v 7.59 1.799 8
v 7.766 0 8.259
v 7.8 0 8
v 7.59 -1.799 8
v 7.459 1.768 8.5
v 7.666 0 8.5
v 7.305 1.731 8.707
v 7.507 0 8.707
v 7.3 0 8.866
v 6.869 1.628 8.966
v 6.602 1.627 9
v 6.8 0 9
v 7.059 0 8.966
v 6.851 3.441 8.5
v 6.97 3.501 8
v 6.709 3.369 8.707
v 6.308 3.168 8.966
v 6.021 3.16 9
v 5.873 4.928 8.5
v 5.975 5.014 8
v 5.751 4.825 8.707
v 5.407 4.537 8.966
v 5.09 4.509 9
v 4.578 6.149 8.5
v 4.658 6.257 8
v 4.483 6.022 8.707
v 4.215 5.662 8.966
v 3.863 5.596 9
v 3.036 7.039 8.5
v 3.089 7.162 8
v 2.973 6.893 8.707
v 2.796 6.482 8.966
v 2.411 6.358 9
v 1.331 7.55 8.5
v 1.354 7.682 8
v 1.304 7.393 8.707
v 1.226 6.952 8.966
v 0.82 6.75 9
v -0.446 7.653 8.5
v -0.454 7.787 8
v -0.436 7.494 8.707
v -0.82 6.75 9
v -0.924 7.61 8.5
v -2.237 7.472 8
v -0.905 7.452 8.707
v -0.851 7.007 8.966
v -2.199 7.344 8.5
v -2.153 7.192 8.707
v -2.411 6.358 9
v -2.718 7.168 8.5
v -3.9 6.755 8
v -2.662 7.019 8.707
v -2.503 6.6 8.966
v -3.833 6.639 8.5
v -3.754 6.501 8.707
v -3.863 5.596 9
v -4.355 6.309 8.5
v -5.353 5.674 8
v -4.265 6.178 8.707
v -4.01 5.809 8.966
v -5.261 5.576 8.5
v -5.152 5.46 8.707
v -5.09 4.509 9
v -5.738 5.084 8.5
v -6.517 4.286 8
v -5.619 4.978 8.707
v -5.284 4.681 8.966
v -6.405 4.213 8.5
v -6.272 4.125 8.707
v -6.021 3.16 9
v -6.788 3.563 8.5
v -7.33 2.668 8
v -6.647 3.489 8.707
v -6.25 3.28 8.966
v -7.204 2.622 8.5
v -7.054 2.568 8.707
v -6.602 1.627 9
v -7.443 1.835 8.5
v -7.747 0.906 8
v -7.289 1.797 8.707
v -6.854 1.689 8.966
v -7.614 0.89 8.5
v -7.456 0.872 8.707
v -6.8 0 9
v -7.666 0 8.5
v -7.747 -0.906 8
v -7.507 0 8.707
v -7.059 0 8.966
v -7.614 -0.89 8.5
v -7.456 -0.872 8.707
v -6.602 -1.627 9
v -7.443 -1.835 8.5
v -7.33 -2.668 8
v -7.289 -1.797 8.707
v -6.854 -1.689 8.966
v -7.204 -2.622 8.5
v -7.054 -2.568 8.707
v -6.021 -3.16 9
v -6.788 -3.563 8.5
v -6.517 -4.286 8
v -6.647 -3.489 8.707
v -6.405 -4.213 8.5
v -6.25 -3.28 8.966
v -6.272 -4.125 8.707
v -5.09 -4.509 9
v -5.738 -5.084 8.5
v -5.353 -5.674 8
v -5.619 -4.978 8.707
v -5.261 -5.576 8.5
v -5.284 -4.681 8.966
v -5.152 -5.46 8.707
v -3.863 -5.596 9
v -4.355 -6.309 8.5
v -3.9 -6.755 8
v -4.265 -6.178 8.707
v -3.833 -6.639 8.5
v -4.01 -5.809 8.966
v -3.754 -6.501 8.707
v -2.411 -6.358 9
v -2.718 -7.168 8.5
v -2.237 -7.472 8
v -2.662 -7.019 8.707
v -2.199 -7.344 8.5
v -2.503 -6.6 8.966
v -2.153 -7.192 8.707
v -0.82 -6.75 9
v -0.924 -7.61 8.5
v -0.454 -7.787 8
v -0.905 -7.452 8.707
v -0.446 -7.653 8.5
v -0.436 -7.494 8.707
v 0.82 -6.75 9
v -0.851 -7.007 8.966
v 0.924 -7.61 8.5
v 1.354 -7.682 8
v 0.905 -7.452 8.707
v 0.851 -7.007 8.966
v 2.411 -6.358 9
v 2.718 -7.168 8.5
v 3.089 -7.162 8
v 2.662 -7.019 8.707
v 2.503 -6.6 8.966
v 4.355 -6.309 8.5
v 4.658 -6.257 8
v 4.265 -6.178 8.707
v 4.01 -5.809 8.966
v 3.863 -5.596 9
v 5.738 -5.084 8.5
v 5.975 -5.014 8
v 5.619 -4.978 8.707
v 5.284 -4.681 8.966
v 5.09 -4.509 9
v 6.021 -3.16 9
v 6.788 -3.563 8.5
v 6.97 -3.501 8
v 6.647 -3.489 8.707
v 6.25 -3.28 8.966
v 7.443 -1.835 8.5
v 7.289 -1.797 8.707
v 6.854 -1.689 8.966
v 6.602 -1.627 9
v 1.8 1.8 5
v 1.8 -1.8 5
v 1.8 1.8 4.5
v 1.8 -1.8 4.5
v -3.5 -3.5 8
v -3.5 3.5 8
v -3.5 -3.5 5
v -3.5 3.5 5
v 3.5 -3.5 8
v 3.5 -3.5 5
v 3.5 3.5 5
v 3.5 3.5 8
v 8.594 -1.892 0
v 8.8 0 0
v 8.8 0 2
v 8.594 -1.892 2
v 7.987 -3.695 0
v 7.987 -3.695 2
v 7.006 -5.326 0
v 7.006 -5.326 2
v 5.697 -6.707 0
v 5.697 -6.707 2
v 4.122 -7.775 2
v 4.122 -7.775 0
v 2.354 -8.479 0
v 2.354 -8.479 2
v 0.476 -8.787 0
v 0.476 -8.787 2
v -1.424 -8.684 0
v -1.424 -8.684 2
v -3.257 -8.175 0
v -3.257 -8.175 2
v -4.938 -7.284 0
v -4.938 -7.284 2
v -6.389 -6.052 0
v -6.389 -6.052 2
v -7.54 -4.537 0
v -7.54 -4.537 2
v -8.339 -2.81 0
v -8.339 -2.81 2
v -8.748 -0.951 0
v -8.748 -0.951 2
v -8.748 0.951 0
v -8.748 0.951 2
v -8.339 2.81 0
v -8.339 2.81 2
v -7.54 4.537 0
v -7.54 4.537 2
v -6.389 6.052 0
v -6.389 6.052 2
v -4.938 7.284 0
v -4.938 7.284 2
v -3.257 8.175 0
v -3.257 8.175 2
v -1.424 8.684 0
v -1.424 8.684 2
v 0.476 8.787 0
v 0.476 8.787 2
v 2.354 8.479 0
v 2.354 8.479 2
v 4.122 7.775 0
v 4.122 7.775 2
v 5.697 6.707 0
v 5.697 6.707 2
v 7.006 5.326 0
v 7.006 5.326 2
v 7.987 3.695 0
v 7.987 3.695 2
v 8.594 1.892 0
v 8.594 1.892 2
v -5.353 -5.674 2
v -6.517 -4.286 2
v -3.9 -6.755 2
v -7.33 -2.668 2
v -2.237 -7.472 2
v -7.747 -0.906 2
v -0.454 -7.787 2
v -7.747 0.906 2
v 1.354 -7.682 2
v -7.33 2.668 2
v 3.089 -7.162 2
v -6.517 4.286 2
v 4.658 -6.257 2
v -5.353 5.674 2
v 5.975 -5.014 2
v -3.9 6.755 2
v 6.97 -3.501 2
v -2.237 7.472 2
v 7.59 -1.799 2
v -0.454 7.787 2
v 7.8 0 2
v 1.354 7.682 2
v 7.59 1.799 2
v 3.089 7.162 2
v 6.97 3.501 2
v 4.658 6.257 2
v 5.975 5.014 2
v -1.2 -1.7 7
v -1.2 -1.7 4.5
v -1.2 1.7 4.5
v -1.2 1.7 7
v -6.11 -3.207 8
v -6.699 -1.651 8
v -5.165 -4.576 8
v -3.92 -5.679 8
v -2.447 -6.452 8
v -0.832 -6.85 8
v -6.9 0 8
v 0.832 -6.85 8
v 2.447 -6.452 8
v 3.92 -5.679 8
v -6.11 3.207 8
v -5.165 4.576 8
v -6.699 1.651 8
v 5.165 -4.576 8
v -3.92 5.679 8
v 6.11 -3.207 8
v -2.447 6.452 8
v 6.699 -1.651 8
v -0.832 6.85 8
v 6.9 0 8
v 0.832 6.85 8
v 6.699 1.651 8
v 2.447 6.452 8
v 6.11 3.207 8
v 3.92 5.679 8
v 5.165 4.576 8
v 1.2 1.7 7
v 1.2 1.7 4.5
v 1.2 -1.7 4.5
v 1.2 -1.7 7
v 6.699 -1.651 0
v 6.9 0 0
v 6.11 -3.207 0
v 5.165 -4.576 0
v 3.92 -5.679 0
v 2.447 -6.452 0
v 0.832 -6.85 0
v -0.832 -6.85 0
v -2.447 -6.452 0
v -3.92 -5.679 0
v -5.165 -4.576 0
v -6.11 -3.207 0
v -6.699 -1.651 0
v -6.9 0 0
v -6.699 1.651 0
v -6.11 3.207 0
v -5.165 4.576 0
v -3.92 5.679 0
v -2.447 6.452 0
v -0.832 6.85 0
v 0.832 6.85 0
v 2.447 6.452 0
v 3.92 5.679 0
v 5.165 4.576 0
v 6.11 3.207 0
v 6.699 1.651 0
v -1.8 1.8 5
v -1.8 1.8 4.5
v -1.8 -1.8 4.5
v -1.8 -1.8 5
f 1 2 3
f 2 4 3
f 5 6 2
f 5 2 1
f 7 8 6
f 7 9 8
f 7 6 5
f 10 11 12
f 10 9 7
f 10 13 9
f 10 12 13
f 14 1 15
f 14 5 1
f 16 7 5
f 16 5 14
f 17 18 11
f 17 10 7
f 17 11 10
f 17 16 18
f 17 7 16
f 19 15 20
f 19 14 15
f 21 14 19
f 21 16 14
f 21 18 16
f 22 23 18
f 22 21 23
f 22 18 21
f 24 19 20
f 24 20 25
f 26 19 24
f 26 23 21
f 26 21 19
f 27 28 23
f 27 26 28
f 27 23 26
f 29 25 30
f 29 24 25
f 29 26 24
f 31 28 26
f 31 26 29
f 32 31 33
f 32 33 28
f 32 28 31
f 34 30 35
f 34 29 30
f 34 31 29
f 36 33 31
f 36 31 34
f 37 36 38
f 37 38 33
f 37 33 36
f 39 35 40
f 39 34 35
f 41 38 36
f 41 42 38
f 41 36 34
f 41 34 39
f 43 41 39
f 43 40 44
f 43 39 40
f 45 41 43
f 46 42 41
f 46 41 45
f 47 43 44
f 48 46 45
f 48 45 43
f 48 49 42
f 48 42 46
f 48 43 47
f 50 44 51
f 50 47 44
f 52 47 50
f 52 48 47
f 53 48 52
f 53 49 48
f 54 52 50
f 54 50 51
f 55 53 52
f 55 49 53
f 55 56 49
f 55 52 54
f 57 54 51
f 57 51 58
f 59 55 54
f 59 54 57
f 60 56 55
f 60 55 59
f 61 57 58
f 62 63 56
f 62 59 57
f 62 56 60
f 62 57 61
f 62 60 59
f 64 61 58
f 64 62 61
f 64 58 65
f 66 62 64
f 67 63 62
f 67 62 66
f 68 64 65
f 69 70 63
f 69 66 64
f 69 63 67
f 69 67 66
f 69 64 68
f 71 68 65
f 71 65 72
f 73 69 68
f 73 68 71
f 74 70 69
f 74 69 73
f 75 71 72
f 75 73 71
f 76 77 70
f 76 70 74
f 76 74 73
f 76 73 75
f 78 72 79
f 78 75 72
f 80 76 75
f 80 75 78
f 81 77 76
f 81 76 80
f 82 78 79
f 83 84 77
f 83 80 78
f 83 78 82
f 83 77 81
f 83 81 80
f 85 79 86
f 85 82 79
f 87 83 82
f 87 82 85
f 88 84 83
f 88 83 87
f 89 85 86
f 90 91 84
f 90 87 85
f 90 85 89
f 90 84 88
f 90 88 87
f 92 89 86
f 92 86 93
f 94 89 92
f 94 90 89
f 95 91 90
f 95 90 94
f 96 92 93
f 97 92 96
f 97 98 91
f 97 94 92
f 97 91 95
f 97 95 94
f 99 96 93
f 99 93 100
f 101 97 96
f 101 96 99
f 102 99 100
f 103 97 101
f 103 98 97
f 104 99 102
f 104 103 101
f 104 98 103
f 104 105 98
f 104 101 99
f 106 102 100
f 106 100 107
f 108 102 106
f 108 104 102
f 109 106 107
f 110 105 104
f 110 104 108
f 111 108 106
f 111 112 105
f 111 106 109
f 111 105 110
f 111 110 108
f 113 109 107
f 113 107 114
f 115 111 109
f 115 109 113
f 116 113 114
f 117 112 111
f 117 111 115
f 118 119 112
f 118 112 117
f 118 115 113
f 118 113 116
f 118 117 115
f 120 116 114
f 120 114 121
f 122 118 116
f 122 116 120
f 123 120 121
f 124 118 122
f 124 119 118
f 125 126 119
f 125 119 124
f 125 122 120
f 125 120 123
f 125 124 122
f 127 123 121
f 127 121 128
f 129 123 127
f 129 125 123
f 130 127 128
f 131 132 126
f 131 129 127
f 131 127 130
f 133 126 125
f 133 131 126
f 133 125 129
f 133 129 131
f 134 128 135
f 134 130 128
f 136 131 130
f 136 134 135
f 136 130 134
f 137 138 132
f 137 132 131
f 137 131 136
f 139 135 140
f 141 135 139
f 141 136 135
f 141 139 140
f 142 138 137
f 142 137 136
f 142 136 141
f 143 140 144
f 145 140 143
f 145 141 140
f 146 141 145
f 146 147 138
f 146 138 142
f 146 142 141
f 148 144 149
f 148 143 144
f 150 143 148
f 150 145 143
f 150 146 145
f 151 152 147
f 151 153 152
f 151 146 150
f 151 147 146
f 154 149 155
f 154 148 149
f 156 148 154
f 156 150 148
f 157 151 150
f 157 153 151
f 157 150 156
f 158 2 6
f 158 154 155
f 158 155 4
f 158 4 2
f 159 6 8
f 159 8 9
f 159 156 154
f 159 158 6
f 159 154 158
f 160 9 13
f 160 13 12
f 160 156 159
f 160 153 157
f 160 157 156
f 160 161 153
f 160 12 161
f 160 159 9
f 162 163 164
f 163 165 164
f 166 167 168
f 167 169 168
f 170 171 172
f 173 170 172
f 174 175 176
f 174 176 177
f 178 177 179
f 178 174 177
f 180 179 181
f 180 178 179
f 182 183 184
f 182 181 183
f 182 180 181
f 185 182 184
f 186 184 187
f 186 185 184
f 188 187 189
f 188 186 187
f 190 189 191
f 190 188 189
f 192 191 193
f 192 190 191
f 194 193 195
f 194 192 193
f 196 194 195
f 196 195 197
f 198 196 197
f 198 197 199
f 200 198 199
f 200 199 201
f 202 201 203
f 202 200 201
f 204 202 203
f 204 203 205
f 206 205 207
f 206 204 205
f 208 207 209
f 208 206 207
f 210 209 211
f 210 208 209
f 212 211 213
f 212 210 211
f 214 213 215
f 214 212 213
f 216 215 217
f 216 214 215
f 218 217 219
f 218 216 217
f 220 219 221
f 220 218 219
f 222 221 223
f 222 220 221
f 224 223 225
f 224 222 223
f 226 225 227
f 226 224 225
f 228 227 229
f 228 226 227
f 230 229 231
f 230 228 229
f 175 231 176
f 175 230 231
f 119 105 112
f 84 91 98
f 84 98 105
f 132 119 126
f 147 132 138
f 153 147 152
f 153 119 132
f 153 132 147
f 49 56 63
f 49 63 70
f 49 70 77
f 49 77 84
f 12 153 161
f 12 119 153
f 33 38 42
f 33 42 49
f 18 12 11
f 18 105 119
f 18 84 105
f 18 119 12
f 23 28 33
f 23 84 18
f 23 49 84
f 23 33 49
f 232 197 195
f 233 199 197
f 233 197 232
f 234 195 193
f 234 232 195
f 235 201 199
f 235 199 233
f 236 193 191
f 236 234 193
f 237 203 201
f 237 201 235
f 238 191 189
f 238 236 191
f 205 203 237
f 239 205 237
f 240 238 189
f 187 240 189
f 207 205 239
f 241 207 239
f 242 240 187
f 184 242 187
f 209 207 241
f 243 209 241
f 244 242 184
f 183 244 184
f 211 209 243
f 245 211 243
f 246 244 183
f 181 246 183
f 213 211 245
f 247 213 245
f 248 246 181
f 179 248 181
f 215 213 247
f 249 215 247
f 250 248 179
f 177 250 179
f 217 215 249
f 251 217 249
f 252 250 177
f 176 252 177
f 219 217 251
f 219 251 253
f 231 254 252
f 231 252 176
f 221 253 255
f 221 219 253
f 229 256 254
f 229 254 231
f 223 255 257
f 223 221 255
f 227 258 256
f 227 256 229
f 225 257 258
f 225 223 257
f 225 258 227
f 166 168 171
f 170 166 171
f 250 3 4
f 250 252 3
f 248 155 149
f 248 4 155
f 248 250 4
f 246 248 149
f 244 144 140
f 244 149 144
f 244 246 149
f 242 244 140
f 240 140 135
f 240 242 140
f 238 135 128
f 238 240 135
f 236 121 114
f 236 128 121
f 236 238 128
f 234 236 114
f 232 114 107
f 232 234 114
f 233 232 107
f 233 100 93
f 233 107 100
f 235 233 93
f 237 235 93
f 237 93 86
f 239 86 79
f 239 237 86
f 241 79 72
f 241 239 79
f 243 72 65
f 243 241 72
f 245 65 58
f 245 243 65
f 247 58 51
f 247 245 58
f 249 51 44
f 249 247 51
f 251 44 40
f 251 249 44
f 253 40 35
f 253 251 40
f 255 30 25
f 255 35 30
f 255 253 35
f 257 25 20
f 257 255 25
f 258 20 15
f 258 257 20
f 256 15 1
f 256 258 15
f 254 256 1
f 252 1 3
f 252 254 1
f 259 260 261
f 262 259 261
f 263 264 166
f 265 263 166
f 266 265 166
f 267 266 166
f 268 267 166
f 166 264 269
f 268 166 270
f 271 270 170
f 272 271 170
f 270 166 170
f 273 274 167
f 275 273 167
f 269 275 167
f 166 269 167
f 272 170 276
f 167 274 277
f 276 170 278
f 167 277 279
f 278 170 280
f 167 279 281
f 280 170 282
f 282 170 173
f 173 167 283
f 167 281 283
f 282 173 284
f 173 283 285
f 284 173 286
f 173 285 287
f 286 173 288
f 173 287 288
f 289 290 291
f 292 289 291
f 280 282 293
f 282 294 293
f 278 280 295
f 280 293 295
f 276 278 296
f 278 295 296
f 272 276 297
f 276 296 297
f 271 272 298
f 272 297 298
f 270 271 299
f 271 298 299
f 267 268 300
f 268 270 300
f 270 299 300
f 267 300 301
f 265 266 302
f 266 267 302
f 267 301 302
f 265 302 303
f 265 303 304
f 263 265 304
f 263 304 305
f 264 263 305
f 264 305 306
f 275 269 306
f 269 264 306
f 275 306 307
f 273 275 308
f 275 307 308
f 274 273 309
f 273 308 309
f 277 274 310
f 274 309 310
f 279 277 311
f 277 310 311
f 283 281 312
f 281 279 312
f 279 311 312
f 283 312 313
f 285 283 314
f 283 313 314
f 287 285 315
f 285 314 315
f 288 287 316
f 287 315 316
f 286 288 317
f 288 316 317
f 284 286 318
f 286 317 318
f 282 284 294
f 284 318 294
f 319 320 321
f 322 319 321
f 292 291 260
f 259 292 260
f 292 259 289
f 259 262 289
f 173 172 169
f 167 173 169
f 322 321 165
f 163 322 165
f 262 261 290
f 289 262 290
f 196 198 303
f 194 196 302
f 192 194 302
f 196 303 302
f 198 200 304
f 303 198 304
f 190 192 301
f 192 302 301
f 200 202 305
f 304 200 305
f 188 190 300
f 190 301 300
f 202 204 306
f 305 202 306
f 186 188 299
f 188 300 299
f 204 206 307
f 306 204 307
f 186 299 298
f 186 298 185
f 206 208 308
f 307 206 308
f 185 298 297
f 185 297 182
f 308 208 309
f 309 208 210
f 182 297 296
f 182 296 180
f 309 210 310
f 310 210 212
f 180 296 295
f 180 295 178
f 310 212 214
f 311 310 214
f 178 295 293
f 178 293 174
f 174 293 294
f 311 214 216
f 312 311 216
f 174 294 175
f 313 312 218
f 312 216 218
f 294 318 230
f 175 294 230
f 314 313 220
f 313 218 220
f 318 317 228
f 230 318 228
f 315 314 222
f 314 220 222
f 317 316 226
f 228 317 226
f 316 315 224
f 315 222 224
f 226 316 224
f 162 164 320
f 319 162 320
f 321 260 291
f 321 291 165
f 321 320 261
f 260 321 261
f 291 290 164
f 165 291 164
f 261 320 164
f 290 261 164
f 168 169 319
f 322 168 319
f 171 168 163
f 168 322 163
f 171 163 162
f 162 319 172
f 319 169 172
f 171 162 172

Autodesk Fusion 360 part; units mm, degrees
sketch "Skizze1" plane through (0, 0, 0) normal (0, 0, 1) x (1, 0, 0)
  circle A0 centre (0, 0) radius 7.8
  circle A1 centre (0, 0) radius 8.8
  line L0 (1.2, -1.7) -> (-1.2, -1.7)
  line L1 (-1.2, -1.7) -> (-1.2, 1.7)
  line L2 (-1.2, 1.7) -> (1.2, 1.7)
  line L3 (1.2, 1.7) -> (1.2, -1.7)
  line L4 (1.2, -1.7) -> (-1.2, 1.7) construction
  line L5 (-1.2, -1.7) -> (1.2, 1.7) construction
  line L6 (4.75, -4.75) -> (-4.75, 4.75) construction
  line L7 (-4.75, -4.75) -> (4.75, 4.75) construction
  circle A2 centre (0, 0) radius 6.9
  line L8 (-1.8, -1.8) -> (1.8, -1.8)
  line L9 (1.8, -1.8) -> (1.8, 1.8)
  line L10 (1.8, 1.8) -> (-1.8, 1.8)
  line L11 (-1.8, 1.8) -> (-1.8, -1.8)
  line L12 (-1.8, -1.8) -> (1.8, 1.8) construction
  line L13 (1.8, -1.8) -> (-1.8, 1.8) construction
  line L14 (-3.5, -3.5) -> (3.5, -3.5)
  line L15 (3.5, -3.5) -> (3.5, 3.5)
  line L16 (3.5, 3.5) -> (-3.5, 3.5)
  line L17 (-3.5, 3.5) -> (-3.5, -3.5)
  line L18 (-3.5, -3.5) -> (3.5, 3.5) construction
  line L19 (3.5, -3.5) -> (-3.5, 3.5) construction
  dimension "d1" = 15.6
  dimension "d2" = 17.6
  dimension "d5" = 2.4
  dimension "d6" = 3.4
  dimension "d17" = 13.8
  dimension "d18" = 3.6
  dimension "d19" = 3.6
  dimension "d20" = 7
  dimension "d21" = 7
extrude "Extrusion1" add sketch "Skizze1" along normal blind 9 contours A0 | L0 L1 L2 L3 | A2 | L8 L9 L10 L11 | L14 L15 L16 L17
extrude "Extrusion2" add sketch "Skizze1" along normal blind 2 contours A1
extrude "Extrusion5" cut sketch "Skizze1" along normal blind 8 contours A2
extrude "Extrusion6" cut sketch "Skizze1" along normal blind 5 contours L14 L15 L16 L17
extrude "Extrusion7" cut sketch "Skizze1" along normal blind 4.5 contours L8 L9 L10 L11
extrude "Extrusion8" cut sketch "Skizze1" along normal blind 7 contours L0 L1 L2 L3
fillet "Abrundung1" radius 1 1 edges at (-7.2722, -2.8206, 9)
